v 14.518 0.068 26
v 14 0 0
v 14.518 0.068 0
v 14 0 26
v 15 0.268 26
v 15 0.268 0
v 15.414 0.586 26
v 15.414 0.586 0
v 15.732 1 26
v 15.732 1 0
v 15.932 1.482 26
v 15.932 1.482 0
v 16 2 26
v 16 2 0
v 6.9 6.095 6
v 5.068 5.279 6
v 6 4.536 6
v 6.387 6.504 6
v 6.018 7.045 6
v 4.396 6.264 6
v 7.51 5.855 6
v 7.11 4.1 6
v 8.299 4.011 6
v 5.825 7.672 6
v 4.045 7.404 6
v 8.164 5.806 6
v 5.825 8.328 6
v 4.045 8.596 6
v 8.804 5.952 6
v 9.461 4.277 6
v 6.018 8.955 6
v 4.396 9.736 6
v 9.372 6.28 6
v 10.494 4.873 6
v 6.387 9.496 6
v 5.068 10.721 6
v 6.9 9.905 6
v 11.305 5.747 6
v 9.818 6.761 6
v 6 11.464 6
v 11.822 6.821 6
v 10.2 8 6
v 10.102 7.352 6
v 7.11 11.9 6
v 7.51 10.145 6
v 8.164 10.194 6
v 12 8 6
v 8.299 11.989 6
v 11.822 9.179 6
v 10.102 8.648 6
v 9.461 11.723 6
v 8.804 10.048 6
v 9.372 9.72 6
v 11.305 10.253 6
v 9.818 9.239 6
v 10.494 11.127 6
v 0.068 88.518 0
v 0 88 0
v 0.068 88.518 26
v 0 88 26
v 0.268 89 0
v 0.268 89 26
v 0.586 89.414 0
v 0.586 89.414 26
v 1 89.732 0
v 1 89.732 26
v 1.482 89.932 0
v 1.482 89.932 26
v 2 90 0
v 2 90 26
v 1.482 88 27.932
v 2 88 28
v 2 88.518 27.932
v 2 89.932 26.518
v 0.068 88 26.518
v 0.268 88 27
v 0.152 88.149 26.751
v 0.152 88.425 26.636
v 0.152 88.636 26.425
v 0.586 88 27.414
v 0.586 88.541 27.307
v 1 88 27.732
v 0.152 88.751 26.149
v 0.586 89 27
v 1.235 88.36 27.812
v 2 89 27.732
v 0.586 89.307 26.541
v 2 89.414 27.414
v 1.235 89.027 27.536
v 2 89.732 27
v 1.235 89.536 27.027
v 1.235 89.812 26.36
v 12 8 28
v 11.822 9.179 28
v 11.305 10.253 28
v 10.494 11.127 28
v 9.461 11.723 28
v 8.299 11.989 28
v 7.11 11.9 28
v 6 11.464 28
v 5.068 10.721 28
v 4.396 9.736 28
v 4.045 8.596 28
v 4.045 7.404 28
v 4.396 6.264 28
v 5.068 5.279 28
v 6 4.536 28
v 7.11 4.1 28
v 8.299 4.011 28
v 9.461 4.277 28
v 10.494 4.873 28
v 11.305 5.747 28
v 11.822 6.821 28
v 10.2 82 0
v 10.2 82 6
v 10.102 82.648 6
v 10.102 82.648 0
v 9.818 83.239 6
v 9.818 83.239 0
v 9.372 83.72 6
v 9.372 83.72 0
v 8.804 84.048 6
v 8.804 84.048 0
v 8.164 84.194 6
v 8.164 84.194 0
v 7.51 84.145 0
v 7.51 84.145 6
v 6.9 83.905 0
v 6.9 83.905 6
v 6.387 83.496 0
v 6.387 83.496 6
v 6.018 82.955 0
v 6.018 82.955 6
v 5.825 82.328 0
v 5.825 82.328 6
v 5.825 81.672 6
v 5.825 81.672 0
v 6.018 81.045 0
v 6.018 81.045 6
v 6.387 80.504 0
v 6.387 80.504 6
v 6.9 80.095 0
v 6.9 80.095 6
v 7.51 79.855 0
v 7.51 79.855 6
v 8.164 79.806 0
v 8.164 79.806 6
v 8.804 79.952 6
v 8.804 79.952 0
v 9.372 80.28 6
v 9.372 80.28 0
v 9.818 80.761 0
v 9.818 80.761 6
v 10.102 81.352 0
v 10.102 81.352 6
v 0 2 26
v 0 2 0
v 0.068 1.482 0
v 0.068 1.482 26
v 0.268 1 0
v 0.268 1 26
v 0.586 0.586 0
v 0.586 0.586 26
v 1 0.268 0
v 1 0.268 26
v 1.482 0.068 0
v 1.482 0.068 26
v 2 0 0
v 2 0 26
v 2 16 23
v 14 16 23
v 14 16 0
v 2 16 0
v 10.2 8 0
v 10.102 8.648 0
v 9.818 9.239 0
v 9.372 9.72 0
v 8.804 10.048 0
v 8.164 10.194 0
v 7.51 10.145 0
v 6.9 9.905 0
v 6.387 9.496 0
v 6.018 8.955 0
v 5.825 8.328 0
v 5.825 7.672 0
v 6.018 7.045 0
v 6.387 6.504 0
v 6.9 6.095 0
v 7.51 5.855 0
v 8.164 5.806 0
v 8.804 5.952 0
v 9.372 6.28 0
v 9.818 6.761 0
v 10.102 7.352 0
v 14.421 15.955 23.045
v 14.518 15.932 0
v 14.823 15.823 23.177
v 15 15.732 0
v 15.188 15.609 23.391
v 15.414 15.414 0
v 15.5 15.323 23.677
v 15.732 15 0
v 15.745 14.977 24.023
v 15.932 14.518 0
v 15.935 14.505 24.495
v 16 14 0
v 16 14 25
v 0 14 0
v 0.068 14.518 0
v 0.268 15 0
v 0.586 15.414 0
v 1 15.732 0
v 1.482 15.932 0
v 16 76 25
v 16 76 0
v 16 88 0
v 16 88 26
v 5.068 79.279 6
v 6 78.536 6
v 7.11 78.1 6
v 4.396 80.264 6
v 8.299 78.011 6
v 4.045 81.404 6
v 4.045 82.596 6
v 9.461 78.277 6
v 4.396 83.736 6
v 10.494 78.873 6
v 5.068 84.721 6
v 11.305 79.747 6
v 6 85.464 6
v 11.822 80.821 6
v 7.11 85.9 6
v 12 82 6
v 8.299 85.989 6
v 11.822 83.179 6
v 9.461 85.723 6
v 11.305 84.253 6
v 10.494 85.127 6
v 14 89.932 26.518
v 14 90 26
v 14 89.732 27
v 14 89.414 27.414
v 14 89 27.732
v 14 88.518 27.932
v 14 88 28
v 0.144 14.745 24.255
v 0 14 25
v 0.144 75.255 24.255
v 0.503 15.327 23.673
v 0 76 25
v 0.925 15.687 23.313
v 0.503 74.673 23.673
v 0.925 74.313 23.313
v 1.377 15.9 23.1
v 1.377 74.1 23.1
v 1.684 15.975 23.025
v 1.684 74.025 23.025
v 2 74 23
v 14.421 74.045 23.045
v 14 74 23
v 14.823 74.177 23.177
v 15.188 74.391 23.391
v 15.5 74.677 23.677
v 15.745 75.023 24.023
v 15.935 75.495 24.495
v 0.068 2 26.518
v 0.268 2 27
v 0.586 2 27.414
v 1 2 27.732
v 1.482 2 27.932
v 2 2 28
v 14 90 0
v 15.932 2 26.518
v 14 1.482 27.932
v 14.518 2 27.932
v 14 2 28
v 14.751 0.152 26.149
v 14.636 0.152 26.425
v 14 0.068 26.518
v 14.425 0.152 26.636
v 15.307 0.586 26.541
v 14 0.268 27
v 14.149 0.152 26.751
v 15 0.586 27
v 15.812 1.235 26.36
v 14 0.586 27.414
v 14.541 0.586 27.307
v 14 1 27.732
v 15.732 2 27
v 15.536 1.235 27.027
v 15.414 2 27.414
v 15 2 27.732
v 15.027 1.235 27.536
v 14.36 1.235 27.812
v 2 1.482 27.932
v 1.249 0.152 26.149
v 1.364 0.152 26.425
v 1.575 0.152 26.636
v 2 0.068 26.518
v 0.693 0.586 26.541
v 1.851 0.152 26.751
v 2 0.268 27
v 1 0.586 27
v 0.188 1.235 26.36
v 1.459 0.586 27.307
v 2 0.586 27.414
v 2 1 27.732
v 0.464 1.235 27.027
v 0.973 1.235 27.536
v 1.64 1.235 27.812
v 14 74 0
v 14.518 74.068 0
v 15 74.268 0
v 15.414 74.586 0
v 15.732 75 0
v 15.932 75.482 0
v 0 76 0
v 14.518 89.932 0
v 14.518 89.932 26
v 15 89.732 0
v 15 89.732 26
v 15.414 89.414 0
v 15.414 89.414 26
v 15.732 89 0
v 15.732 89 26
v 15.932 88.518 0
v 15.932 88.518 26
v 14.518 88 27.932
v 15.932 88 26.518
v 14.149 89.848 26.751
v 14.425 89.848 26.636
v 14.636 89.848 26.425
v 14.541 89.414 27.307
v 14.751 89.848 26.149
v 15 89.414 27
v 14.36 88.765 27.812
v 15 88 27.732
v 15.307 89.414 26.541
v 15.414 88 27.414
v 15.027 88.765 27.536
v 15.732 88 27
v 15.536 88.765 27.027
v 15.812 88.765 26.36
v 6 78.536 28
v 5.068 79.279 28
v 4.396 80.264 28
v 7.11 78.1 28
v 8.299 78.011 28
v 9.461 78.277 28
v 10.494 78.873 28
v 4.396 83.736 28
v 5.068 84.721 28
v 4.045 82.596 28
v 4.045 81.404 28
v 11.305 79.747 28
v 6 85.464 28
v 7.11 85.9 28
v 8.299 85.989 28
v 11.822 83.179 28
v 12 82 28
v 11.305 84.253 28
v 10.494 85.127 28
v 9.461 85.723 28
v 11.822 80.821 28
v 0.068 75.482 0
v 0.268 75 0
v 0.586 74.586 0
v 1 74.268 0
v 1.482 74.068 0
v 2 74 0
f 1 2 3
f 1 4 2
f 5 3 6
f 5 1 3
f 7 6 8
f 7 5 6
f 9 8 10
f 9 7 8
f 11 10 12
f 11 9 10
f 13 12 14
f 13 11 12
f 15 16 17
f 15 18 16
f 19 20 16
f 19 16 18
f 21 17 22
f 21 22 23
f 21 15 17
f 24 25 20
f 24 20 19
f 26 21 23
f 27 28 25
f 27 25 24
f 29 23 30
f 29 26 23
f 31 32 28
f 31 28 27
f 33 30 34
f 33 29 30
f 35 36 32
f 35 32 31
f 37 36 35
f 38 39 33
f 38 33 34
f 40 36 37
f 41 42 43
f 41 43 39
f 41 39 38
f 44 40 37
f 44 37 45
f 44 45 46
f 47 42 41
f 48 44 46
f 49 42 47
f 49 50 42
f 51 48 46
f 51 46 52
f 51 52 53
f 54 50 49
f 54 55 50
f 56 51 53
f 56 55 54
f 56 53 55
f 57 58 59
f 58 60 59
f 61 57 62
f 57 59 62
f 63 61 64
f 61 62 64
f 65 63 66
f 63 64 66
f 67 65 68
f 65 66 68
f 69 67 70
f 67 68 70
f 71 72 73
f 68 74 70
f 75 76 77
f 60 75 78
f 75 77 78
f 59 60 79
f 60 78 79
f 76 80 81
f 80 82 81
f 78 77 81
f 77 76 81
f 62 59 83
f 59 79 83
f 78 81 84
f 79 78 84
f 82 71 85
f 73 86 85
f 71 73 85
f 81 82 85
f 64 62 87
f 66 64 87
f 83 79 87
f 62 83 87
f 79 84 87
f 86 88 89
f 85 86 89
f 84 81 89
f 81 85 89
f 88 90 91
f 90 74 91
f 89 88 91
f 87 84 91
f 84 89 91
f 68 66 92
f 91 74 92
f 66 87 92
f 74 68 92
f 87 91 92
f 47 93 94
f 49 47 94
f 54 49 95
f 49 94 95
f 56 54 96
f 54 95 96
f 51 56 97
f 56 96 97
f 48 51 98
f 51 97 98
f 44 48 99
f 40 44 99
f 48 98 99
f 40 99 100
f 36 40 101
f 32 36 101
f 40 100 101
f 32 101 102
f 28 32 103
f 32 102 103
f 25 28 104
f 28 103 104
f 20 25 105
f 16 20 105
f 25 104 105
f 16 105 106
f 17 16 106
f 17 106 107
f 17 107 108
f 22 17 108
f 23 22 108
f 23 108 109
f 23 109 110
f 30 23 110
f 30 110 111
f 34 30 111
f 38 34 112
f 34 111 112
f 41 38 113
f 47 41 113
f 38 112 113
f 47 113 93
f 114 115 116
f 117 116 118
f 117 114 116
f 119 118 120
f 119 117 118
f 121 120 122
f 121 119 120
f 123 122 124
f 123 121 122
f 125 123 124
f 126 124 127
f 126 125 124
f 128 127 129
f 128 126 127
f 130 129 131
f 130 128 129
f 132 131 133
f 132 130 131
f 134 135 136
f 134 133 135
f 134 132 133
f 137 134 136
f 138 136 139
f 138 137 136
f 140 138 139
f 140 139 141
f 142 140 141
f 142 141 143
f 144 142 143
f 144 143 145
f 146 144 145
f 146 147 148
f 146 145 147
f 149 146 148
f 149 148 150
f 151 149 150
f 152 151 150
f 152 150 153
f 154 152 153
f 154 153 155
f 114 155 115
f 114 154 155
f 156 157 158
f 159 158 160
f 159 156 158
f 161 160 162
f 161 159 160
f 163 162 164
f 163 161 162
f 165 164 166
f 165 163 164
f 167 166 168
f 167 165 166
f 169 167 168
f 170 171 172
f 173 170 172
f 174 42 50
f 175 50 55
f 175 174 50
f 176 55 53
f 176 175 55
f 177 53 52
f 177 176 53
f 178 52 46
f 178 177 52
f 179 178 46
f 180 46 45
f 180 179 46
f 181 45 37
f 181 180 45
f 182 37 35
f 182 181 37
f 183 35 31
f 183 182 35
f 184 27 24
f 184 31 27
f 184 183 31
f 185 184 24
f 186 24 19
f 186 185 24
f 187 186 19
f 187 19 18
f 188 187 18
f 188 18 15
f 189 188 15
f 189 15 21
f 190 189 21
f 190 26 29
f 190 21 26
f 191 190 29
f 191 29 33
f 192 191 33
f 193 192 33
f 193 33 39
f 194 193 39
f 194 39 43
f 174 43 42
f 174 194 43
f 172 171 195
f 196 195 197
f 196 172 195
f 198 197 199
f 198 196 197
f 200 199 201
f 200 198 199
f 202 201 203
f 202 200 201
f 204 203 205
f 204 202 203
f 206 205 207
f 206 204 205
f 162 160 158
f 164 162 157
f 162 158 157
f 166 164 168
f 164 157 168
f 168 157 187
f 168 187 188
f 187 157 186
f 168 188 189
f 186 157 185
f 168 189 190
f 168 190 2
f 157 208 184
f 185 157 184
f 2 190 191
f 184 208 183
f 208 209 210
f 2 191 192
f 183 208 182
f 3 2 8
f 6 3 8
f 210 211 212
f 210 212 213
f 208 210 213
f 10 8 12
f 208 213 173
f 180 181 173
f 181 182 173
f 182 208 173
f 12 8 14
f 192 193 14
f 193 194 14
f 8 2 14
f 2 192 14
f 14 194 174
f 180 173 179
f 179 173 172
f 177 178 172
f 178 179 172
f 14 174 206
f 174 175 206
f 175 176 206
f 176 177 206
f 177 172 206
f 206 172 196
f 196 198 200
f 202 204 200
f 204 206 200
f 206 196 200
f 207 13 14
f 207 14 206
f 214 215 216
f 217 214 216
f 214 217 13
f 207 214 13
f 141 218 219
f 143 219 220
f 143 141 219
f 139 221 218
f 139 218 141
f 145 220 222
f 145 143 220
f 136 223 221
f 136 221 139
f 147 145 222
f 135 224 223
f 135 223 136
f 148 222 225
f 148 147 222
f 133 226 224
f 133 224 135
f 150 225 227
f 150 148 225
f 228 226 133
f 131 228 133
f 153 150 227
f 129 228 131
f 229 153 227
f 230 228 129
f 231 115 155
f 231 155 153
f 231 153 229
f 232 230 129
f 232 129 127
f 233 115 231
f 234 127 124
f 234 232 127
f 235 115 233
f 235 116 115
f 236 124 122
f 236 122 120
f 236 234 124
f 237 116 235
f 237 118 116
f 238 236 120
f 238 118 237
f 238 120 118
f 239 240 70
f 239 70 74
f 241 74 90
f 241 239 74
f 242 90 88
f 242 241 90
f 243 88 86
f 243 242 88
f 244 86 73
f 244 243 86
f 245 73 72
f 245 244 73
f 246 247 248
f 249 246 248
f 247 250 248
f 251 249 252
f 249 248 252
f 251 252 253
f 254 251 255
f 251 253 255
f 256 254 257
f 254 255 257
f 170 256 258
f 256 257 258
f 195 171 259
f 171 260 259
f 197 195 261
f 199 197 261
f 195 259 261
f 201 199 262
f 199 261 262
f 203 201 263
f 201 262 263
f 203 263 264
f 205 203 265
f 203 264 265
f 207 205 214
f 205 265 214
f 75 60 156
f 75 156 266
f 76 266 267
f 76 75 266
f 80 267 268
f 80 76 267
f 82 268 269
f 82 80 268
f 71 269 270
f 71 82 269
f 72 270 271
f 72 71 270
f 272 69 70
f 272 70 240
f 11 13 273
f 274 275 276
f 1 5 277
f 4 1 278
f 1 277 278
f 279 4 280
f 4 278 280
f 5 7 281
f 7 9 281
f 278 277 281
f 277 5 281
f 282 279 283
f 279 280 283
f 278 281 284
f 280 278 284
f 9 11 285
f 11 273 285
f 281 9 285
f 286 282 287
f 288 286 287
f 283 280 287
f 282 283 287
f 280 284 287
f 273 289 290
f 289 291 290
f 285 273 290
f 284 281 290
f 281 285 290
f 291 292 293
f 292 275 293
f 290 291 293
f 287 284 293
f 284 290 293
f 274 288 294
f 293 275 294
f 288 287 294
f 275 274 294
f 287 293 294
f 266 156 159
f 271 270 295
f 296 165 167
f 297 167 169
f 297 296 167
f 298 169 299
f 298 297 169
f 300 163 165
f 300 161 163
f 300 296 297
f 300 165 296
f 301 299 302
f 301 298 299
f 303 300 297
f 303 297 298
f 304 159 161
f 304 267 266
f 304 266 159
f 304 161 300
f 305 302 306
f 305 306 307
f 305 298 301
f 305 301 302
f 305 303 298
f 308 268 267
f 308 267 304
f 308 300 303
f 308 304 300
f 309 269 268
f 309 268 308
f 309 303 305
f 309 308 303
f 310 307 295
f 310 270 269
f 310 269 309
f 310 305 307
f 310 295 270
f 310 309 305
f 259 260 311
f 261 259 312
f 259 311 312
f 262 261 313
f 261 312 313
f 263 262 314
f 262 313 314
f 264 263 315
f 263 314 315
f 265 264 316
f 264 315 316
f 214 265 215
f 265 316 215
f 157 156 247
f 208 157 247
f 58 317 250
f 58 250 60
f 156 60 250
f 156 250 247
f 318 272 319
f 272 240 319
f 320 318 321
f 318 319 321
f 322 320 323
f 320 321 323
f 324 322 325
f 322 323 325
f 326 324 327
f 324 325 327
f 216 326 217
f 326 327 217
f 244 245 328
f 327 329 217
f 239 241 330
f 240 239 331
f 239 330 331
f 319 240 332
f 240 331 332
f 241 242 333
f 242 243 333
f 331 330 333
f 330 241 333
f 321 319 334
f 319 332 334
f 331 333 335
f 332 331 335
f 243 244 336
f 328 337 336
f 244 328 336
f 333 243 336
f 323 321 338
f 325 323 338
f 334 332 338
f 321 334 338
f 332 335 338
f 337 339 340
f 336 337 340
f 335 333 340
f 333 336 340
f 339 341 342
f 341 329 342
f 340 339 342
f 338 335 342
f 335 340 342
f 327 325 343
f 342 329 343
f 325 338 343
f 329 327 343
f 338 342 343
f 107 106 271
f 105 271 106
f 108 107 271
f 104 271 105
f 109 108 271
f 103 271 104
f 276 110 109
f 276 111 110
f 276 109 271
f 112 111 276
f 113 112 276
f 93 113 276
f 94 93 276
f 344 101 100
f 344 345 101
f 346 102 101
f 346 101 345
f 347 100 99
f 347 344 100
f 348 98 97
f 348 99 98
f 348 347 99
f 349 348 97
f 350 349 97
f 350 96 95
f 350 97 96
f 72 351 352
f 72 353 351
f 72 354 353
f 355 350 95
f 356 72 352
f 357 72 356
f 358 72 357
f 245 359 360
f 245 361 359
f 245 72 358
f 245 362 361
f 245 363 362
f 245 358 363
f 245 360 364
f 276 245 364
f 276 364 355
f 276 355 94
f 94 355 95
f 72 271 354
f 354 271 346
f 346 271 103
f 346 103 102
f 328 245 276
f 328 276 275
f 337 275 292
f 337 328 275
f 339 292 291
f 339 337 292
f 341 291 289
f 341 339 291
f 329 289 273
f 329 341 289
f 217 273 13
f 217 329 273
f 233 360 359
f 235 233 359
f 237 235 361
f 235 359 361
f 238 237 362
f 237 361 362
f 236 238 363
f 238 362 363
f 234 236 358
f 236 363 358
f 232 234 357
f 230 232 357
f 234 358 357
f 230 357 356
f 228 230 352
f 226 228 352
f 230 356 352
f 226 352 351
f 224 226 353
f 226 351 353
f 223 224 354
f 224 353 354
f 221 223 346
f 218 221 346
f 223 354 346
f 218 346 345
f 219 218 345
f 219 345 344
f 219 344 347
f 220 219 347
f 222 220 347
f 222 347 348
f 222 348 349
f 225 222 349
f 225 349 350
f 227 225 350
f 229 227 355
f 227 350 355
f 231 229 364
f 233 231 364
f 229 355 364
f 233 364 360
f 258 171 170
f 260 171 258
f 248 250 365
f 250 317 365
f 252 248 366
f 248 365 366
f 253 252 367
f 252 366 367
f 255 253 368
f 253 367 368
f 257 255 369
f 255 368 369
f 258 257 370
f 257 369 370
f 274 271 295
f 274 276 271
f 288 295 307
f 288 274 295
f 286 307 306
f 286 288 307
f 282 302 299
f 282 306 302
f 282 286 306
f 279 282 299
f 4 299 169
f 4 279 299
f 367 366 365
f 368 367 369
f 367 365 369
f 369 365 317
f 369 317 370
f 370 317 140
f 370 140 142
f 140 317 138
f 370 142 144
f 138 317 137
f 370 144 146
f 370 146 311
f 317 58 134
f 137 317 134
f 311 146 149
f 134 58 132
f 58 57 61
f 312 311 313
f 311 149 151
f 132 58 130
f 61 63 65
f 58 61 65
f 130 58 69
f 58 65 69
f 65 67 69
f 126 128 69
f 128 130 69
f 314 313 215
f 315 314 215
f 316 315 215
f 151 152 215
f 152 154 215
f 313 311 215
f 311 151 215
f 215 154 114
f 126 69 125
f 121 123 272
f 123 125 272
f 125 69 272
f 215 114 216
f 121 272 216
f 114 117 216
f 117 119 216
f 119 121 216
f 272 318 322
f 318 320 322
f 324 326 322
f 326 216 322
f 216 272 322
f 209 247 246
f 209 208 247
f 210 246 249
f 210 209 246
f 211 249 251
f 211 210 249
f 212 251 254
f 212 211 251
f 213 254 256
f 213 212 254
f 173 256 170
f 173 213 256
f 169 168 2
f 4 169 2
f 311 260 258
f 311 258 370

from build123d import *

# Parameters (mm, degrees)
SKETCH1_W           = 16
SKETCH1_H           = 90
SKETCH1_R           = 2.2
BOSS_EXTRUDE1_DEPTH = 28
SKETCH2_W           = 23
SKETCH2_H           = 58
CUT_EXTRUDE1_DEPTH  = 16
SKETCH3_R           = 4
CUT_EXTRUDE2_DEPTH  = 22
FILLET1_R           = 2


with BuildPart() as part:
    # Sketch1 → Boss-Extrude1 (new body)
    with BuildSketch(Plane.XY):
        with Locations((8, 45)):
            Rectangle(SKETCH1_W, SKETCH1_H)
        with Locations((8, 82)):
            Circle(SKETCH1_R, mode=Mode.SUBTRACT)
        with Locations((8, 8)):
            Circle(SKETCH1_R, mode=Mode.SUBTRACT)
    extrude(amount=BOSS_EXTRUDE1_DEPTH)

    # Sketch2 → Cut-Extrude1 (cut)
    with BuildSketch(Plane(origin=(16, 0, 0), x_dir=(0, 0, -1), z_dir=(1, 0, 0))):
        with Locations((-11.5, 45)):
            Rectangle(SKETCH2_W, SKETCH2_H)
    extrude(amount=-CUT_EXTRUDE1_DEPTH, mode=Mode.SUBTRACT)

    # Sketch3 → Cut-Extrude2 (cut)
    with BuildSketch(Plane.XY.offset(28)):
        with Locations((8, 82)):
            Circle(SKETCH3_R)
        with Locations((8, 8)):
            Circle(SKETCH3_R)
    extrude(amount=-CUT_EXTRUDE2_DEPTH, mode=Mode.SUBTRACT)

    # Fillet1
    fillet1_edges = [part.edges().sort_by_distance(p)[0] for p in [
        (16, 45, 28),
        (8, 90, 28),
        (16, 74, 11.5),
        (16, 45, 23),
        (16, 16, 11.5),
        (0, 16, 11.5),
        (0, 45, 23),
        (0, 74, 11.5),
        (0, 45, 28),
        (0, 90, 14),
        (16, 90, 14),
        (16, 0, 14),
        (0, 0, 14),
        (8, 0, 28),
    ]]
    fillet(fillet1_edges, radius=FILLET1_R)


solid = part.part
